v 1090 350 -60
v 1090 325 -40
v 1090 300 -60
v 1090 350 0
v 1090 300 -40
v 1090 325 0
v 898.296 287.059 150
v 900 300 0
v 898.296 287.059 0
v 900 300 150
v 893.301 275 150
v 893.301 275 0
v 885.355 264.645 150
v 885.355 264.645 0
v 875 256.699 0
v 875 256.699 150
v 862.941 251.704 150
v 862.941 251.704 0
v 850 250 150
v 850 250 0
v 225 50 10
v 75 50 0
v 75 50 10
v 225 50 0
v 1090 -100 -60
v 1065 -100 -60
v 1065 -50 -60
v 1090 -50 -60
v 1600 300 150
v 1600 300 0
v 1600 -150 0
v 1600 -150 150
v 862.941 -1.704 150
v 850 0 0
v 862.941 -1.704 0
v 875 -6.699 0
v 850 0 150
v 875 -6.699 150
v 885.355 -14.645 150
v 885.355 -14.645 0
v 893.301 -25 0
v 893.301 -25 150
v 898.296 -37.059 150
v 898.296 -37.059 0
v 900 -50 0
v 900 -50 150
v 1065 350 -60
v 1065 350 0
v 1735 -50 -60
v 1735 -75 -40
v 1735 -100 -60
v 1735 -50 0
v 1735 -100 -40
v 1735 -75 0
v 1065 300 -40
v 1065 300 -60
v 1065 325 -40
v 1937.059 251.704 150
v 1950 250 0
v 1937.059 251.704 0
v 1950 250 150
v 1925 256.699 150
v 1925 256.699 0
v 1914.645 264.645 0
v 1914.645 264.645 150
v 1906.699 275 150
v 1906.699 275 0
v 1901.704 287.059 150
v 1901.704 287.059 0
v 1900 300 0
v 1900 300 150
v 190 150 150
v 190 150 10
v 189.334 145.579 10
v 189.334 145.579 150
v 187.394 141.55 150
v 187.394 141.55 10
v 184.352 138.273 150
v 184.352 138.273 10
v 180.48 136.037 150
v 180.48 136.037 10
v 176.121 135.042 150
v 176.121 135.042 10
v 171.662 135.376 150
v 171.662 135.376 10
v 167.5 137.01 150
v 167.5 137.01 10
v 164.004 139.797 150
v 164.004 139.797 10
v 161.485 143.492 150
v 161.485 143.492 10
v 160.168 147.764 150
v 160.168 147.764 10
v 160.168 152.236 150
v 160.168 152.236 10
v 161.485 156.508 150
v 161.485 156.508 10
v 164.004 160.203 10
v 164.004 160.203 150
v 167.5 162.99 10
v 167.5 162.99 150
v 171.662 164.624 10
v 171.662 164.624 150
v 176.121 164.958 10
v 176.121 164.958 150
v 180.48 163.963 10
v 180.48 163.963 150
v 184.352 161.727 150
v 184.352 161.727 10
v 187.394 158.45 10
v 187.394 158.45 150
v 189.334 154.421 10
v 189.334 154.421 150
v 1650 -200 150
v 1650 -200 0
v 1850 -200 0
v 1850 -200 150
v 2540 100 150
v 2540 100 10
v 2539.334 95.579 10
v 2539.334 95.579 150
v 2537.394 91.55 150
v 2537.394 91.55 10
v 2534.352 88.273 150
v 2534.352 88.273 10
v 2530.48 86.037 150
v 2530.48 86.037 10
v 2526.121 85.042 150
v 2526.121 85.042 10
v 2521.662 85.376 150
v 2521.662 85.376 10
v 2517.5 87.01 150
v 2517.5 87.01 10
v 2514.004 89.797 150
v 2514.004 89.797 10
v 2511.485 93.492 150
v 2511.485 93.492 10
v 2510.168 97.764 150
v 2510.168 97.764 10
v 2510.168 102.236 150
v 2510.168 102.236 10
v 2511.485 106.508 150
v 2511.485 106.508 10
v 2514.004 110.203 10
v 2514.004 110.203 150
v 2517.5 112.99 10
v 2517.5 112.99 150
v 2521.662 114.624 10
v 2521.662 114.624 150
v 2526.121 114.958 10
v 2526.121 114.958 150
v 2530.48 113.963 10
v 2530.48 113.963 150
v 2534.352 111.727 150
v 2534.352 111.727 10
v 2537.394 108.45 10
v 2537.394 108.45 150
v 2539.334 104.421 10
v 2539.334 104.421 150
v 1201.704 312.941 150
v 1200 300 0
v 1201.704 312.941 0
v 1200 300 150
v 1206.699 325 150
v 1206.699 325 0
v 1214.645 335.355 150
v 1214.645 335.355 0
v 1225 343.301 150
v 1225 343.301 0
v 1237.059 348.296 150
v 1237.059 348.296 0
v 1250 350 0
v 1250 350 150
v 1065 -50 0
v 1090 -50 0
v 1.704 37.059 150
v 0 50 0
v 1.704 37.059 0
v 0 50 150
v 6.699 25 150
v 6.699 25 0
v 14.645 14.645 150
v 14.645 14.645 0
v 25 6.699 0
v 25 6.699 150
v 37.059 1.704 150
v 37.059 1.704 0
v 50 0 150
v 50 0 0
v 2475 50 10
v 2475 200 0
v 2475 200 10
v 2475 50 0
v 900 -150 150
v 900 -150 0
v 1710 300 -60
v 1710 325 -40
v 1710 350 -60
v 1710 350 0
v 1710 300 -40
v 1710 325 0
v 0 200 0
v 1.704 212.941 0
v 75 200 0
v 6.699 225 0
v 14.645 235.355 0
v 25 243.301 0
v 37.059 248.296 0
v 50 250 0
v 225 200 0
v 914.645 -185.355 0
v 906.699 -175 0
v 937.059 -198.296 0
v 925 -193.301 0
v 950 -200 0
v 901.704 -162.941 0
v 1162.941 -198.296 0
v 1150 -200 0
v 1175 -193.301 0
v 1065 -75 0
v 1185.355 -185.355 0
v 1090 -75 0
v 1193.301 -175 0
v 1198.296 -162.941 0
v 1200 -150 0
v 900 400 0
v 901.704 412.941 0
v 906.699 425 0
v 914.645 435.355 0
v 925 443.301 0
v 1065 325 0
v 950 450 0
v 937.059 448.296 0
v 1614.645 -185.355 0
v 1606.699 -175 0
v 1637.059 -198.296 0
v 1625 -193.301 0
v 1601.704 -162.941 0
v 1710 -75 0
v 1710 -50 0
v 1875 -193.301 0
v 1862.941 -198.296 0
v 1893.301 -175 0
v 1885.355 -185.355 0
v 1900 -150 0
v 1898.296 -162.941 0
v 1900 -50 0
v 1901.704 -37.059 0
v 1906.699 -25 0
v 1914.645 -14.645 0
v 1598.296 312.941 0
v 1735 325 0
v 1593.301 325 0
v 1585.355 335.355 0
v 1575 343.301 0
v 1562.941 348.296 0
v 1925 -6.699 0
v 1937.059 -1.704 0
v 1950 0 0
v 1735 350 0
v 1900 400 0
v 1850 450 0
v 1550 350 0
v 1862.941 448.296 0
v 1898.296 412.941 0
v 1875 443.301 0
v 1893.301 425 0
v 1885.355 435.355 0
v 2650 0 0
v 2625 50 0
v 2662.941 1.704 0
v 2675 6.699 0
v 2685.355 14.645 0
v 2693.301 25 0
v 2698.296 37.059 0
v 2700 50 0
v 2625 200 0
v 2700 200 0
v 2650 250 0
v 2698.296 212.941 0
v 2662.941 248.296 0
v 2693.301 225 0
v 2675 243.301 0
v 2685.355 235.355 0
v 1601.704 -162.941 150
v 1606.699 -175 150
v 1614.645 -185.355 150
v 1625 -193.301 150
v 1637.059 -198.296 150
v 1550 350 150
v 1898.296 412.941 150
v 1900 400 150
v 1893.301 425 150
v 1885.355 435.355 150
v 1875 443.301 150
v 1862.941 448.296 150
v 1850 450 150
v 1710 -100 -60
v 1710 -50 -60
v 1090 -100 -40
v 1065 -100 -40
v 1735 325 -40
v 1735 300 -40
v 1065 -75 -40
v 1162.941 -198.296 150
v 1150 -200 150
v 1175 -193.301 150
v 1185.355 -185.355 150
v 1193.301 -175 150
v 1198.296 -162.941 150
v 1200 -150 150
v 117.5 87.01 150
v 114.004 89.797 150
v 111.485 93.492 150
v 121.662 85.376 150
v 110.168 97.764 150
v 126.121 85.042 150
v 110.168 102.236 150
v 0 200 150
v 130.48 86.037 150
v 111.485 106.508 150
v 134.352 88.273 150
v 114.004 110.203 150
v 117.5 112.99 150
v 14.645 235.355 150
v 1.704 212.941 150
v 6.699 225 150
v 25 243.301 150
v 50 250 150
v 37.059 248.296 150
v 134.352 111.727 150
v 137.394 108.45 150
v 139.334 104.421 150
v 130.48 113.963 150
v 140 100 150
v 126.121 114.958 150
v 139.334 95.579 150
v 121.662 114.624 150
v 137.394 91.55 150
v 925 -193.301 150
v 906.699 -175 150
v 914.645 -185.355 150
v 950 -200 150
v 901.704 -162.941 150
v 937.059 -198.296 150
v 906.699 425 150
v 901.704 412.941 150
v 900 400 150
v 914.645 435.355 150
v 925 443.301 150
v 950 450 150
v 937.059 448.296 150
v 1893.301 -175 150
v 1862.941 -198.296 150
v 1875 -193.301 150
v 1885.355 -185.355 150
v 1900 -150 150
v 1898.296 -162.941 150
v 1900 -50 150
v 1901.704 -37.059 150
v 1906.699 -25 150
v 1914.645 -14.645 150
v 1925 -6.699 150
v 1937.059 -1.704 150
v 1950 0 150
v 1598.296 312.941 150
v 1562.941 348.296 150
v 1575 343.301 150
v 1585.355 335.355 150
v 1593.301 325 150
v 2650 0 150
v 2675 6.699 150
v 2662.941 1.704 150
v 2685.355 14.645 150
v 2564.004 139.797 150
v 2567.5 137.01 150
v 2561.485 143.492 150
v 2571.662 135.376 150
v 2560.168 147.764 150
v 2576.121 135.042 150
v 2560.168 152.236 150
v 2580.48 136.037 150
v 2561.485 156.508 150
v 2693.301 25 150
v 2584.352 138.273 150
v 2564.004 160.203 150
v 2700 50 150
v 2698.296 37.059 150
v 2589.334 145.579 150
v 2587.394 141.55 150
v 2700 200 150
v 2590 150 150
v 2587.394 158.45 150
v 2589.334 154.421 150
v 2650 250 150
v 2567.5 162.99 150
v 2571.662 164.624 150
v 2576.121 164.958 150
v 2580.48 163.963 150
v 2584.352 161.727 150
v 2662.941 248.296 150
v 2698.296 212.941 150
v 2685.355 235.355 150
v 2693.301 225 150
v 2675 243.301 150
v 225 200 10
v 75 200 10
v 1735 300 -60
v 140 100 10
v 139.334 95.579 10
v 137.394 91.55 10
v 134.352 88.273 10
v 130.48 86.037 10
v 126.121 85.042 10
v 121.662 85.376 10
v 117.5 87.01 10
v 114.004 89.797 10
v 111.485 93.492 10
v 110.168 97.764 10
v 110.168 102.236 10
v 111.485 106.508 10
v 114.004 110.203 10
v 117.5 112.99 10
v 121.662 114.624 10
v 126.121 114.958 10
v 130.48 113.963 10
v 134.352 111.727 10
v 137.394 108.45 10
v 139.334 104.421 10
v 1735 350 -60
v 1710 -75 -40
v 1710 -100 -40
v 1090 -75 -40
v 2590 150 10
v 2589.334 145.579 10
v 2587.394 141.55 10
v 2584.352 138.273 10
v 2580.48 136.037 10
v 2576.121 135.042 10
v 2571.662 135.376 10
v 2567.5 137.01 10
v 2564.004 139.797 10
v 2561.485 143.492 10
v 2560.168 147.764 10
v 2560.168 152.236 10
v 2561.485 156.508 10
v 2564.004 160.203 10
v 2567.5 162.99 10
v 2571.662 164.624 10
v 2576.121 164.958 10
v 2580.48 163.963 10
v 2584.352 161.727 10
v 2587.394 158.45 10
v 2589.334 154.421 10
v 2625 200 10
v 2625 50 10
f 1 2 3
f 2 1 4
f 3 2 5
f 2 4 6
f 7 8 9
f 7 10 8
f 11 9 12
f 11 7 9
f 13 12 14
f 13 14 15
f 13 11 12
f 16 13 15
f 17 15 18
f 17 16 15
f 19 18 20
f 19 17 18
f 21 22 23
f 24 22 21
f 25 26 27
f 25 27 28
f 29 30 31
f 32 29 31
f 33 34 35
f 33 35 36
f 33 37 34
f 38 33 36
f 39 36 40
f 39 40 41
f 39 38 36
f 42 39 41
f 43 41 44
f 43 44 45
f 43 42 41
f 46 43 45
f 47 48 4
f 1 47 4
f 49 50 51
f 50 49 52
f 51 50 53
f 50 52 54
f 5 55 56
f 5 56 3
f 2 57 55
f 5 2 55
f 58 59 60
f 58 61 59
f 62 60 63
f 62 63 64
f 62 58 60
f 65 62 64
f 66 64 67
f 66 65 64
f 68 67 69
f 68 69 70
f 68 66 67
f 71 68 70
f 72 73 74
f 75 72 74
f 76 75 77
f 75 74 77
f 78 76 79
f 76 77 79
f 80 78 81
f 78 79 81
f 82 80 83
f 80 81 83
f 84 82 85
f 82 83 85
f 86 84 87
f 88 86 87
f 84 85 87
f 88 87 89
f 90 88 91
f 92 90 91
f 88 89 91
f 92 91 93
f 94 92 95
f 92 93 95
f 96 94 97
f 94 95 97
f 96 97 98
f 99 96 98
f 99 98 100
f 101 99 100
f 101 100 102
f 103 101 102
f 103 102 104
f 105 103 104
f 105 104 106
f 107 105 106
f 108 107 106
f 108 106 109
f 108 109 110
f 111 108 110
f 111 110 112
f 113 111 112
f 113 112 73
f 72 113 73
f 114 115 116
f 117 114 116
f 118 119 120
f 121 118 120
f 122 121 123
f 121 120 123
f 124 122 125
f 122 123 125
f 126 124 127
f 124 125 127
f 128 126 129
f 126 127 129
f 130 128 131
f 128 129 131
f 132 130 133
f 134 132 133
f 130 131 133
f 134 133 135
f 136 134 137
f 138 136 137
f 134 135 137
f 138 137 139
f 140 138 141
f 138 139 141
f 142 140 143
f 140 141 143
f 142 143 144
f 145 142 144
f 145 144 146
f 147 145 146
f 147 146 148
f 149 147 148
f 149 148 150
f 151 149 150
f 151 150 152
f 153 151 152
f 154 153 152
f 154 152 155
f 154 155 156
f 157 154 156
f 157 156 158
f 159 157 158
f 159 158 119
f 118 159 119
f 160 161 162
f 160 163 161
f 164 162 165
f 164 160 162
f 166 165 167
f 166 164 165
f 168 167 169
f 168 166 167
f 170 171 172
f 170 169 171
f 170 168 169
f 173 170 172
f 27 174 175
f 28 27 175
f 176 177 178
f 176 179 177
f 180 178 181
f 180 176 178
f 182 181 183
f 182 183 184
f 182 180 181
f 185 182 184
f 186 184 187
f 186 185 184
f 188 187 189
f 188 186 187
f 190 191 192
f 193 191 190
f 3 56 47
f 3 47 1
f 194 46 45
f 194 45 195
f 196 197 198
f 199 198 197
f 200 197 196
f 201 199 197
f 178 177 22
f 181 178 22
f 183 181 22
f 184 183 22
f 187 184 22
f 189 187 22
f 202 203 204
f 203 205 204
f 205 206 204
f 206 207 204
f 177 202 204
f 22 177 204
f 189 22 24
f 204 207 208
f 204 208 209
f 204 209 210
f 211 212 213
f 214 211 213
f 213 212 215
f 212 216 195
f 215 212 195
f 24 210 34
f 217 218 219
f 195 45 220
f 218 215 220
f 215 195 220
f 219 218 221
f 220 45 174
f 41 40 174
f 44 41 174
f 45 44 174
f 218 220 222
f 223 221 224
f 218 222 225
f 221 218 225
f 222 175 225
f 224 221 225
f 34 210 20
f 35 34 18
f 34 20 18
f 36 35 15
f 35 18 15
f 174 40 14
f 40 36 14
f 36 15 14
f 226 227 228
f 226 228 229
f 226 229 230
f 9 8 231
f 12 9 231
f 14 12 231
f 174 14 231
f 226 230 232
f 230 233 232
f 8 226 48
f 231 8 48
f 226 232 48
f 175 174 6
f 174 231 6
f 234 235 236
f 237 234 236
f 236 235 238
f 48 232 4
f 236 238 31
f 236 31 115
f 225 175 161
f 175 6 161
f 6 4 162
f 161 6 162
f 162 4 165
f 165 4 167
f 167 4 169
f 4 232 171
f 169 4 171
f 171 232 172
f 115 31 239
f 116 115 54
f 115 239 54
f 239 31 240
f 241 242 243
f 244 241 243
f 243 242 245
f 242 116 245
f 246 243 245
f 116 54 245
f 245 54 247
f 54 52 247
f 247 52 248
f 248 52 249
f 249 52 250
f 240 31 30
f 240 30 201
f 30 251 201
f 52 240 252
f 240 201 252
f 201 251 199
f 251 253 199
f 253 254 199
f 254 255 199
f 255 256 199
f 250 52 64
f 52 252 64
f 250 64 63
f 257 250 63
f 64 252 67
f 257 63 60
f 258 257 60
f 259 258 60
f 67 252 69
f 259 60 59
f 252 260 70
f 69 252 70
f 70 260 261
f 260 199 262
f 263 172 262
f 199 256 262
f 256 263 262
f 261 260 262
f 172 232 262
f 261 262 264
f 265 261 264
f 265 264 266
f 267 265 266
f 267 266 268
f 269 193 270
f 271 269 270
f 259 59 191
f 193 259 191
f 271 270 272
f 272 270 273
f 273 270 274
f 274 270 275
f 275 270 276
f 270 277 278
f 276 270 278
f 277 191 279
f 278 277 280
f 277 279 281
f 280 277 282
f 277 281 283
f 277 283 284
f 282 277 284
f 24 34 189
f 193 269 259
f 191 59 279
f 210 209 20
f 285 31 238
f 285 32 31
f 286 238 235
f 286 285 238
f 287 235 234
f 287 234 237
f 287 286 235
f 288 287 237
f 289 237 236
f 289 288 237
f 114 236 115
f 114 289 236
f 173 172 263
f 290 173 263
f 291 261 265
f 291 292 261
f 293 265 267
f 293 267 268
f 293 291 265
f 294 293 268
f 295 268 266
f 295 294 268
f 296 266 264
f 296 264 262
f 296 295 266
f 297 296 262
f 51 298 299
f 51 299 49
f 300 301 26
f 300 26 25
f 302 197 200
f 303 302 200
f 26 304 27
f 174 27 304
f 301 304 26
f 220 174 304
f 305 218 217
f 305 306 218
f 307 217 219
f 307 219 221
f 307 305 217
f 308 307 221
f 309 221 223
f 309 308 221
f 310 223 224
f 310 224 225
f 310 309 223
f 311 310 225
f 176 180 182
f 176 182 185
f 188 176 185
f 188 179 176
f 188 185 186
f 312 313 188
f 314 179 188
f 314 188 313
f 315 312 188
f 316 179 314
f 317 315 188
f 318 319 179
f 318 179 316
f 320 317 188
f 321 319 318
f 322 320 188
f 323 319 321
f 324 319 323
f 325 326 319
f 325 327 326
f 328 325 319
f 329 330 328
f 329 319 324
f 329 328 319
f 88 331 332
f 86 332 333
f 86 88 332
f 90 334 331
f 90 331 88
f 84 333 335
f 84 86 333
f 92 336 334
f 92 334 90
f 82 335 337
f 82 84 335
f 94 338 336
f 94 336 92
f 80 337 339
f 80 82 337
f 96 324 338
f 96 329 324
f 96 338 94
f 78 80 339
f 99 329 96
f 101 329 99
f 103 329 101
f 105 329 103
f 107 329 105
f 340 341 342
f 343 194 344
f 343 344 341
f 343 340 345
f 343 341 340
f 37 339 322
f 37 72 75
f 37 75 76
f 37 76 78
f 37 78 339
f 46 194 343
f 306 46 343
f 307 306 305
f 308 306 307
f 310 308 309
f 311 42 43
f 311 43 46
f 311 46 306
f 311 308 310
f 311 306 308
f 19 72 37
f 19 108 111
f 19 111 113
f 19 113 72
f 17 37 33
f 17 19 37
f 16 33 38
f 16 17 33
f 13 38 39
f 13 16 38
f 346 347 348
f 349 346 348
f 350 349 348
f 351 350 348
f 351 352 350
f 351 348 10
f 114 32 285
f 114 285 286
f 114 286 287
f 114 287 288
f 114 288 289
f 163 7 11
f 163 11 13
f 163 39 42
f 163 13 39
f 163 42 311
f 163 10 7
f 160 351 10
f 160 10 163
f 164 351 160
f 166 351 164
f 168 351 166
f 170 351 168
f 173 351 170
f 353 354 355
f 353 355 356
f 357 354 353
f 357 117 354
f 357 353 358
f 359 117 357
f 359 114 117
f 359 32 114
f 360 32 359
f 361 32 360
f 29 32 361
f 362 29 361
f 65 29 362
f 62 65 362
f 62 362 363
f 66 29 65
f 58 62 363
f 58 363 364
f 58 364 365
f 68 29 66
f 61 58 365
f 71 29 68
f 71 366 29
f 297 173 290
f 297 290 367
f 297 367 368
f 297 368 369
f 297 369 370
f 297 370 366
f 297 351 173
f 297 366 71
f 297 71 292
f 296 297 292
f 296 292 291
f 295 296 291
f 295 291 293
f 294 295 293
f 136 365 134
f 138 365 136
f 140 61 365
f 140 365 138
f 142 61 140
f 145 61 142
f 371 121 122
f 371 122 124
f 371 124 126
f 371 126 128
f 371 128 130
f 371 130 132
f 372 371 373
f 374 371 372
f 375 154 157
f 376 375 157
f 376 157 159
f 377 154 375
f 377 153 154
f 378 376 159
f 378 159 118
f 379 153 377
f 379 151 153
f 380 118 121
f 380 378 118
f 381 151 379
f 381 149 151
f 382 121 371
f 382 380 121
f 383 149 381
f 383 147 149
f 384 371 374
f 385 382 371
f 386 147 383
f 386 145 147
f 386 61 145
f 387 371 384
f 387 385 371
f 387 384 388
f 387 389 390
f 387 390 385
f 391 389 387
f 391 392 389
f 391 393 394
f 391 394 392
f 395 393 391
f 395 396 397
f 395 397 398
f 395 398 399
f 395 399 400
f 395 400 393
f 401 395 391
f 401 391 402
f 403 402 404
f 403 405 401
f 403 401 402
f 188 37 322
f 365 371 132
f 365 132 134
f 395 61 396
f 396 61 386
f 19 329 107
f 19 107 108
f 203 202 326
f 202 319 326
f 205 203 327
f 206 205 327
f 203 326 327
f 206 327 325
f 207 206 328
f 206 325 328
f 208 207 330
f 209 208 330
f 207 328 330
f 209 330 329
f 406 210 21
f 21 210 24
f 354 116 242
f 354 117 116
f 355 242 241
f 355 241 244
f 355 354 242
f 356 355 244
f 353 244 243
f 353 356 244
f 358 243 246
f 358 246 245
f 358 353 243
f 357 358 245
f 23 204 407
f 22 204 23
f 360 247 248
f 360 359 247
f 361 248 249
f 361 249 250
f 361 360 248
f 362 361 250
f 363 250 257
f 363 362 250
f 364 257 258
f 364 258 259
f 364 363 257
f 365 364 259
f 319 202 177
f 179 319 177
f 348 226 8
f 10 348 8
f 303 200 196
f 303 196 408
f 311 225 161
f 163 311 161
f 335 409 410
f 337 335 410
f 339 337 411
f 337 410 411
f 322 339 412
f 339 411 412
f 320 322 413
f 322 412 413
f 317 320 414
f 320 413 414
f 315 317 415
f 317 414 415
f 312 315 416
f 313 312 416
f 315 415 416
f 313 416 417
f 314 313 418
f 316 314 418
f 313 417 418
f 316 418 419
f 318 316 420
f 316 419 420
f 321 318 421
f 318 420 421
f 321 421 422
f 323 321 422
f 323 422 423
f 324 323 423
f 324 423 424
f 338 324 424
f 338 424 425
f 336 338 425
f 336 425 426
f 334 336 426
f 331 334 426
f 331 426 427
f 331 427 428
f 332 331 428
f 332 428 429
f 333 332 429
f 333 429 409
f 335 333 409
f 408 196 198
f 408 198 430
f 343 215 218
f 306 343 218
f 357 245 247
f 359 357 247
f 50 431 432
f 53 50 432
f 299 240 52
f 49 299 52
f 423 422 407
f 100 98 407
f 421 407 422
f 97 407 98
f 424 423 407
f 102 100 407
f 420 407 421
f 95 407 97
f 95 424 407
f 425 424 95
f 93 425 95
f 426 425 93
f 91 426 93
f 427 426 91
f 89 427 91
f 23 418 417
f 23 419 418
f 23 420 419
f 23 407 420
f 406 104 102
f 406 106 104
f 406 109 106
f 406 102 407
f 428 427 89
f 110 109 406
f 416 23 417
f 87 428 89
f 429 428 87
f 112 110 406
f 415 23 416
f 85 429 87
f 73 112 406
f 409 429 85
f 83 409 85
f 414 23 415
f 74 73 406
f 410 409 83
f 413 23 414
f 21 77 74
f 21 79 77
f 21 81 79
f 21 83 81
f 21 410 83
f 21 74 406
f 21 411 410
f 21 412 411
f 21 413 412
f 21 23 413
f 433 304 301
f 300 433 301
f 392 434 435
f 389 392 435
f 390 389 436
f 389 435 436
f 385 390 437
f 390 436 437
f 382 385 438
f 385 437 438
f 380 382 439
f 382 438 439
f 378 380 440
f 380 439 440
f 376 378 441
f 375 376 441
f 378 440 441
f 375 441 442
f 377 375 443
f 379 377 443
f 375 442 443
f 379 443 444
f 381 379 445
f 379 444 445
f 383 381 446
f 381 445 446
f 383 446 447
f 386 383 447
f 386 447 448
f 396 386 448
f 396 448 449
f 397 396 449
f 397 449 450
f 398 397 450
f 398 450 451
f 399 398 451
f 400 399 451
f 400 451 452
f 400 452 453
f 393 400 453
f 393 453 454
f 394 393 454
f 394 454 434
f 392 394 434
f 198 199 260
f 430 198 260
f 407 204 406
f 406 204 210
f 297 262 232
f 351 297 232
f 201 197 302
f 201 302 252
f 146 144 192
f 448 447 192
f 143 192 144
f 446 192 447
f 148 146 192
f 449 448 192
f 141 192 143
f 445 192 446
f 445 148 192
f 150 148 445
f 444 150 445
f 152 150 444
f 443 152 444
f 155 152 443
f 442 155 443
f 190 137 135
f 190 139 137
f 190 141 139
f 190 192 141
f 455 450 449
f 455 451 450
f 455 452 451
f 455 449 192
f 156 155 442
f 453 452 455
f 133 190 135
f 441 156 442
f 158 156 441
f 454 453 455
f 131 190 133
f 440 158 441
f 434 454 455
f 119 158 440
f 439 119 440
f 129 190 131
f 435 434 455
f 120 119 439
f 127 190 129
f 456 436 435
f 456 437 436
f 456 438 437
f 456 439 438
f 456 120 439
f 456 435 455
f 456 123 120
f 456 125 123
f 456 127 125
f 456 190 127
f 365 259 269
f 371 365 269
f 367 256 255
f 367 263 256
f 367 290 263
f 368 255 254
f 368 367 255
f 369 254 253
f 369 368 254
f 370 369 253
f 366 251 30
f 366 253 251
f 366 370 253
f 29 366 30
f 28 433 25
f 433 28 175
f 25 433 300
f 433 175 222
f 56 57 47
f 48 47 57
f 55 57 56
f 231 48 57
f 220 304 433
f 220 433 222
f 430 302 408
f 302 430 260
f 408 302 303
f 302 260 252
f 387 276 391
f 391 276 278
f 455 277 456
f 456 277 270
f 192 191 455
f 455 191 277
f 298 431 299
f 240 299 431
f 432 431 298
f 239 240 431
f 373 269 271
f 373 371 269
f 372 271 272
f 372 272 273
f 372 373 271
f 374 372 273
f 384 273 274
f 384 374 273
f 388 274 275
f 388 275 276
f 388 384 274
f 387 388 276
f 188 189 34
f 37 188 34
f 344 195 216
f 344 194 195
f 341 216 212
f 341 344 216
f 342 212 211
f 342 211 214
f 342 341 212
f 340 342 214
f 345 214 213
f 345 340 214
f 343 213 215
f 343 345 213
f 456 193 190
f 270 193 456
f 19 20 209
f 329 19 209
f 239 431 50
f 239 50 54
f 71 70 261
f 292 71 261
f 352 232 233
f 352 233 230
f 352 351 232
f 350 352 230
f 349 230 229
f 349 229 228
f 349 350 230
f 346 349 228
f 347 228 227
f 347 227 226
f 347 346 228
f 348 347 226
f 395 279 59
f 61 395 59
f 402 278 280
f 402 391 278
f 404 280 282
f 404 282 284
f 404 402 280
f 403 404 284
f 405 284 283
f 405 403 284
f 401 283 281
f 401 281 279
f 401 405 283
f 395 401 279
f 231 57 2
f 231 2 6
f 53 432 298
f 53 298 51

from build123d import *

# Parameters (mm, degrees)
F1_DEPTH  = 150
F2_R      = 50
F3_W      = 150
F3_H      = 150
F4_DEPTH  = 10
F6_R      = 15
F7_DEPTH  = 200
F8_R      = 15
F9_DEPTH  = 200
F10_W     = 25
F10_H     = 50
F11_DEPTH = 60
F12_W     = 25
F12_H     = 40
F13_DEPTH = 100
F14_W     = 25
F14_H     = 40
F15_DEPTH = 100
F16_W     = 25
F16_H     = 40
F17_DEPTH = 1000


# Not quite as in the source:
# - two fillets or chamfers of one size are made in one step
# - a feature names something its author has since deleted; it is built from what else it names


with BuildPart() as f1:
    # F0 (on Top) → F1 (new body)
    with BuildSketch(Plane.XY):
        Polygon((0, 250), (0, 0), (900, 0), (900, -200), (1200, -200), (1200, 350), (1600, 350), (1600, -200), (1900, -200), (1900, 0), (2700, 0), (2700, 250), (1900, 250), (1900, 450), (900, 450), (900, 250), align=None)
    extrude(amount=F1_DEPTH)

    # F2
    f2_edges = [f1.edges().sort_by_distance(p)[0] for p in [
        (1600, 350, 75),
        (1600, -200, 75),
        (1900, -200, 75),
        (1900, 450, 75),
        (900, 450, 75),
        (900, 250, 75),
        (0, 250, 75),
        (0, 0, 75),
        (900, 0, 75),
        (900, -200, 75),
        (1200, -200, 75),
        (1200, 350, 75),
        (1900, 0, 75),
        (2700, 0, 75),
        (2700, 250, 75),
        (1900, 250, 75),
    ]]
    fillet(f2_edges, radius=F2_R)

    # F3 (on face) → F4 (cut)
    with BuildSketch(Plane(origin=(0, 0, 0), x_dir=(1, 0, 0), z_dir=(0, 0, -1))):
        with Locations((150, -125)):
            Rectangle(F3_W, F3_H)
        with Locations((2550, -125)):
            Rectangle(F3_W, F3_H)
    extrude(amount=-F4_DEPTH, mode=Mode.SUBTRACT)

    # F6 (on face) → F7 (cut)
    with BuildSketch(Plane(origin=(0, 0, 10), x_dir=(1, 0, 0), z_dir=(0, 0, -1))):
        with Locations((175, -150)):
            Circle(F6_R)
        with Locations((125, -100)):
            Circle(F6_R)
    extrude(amount=-F7_DEPTH, mode=Mode.SUBTRACT)

    # F8 (on face) → F9 (cut)
    with BuildSketch(Plane(origin=(0, 0, 10), x_dir=(1, 0, 0), z_dir=(0, 0, -1))):
        with Locations((2525, -100)):
            Circle(F8_R)
        with Locations((2575, -150)):
            Circle(F8_R)
    extrude(amount=-F9_DEPTH, mode=Mode.SUBTRACT)

    # F10 (on face) → F11 (join)
    with BuildSketch(Plane(origin=(0, 0, 0), x_dir=(1, 0, 0), z_dir=(0, 0, -1))):
        with Locations((1077.5, 75)):
            Rectangle(F10_W, F10_H)
        with Locations((1722.5, 75)):
            Rectangle(F10_W, F10_H)
        with Locations((1077.5, -325)):
            Rectangle(F10_W, F10_H)
        with Locations((1722.5, -325)):
            Rectangle(F10_W, F10_H)
    extrude(amount=F11_DEPTH)

    # F12 (on face) → F13 (cut)
    with BuildSketch(Plane(origin=(1065, 0, 0), x_dir=(0, -1, 0), z_dir=(-1, 0, 0))):
        with Locations((87.5, -20)):
            Rectangle(F12_W, F12_H)
    extrude(amount=-F13_DEPTH, mode=Mode.SUBTRACT)

    # F14 (on face) → F15 (cut)
    with BuildSketch(Plane(origin=(1710, 0, 0), x_dir=(0, -1, 0), z_dir=(-1, 0, 0))):
        with Locations((87.5, -20)):
            Rectangle(F14_W, F14_H)
    extrude(amount=-F15_DEPTH, mode=Mode.SUBTRACT)

    # F16 (on face) → F17 (cut)
    with BuildSketch(Plane(origin=(1065, 0, 0), x_dir=(0, -1, 0), z_dir=(-1, 0, 0))):
        with Locations((-312.5, -20)):
            Rectangle(F16_W, F16_H)
    extrude(amount=-F17_DEPTH, mode=Mode.SUBTRACT)


solid = f1.part
